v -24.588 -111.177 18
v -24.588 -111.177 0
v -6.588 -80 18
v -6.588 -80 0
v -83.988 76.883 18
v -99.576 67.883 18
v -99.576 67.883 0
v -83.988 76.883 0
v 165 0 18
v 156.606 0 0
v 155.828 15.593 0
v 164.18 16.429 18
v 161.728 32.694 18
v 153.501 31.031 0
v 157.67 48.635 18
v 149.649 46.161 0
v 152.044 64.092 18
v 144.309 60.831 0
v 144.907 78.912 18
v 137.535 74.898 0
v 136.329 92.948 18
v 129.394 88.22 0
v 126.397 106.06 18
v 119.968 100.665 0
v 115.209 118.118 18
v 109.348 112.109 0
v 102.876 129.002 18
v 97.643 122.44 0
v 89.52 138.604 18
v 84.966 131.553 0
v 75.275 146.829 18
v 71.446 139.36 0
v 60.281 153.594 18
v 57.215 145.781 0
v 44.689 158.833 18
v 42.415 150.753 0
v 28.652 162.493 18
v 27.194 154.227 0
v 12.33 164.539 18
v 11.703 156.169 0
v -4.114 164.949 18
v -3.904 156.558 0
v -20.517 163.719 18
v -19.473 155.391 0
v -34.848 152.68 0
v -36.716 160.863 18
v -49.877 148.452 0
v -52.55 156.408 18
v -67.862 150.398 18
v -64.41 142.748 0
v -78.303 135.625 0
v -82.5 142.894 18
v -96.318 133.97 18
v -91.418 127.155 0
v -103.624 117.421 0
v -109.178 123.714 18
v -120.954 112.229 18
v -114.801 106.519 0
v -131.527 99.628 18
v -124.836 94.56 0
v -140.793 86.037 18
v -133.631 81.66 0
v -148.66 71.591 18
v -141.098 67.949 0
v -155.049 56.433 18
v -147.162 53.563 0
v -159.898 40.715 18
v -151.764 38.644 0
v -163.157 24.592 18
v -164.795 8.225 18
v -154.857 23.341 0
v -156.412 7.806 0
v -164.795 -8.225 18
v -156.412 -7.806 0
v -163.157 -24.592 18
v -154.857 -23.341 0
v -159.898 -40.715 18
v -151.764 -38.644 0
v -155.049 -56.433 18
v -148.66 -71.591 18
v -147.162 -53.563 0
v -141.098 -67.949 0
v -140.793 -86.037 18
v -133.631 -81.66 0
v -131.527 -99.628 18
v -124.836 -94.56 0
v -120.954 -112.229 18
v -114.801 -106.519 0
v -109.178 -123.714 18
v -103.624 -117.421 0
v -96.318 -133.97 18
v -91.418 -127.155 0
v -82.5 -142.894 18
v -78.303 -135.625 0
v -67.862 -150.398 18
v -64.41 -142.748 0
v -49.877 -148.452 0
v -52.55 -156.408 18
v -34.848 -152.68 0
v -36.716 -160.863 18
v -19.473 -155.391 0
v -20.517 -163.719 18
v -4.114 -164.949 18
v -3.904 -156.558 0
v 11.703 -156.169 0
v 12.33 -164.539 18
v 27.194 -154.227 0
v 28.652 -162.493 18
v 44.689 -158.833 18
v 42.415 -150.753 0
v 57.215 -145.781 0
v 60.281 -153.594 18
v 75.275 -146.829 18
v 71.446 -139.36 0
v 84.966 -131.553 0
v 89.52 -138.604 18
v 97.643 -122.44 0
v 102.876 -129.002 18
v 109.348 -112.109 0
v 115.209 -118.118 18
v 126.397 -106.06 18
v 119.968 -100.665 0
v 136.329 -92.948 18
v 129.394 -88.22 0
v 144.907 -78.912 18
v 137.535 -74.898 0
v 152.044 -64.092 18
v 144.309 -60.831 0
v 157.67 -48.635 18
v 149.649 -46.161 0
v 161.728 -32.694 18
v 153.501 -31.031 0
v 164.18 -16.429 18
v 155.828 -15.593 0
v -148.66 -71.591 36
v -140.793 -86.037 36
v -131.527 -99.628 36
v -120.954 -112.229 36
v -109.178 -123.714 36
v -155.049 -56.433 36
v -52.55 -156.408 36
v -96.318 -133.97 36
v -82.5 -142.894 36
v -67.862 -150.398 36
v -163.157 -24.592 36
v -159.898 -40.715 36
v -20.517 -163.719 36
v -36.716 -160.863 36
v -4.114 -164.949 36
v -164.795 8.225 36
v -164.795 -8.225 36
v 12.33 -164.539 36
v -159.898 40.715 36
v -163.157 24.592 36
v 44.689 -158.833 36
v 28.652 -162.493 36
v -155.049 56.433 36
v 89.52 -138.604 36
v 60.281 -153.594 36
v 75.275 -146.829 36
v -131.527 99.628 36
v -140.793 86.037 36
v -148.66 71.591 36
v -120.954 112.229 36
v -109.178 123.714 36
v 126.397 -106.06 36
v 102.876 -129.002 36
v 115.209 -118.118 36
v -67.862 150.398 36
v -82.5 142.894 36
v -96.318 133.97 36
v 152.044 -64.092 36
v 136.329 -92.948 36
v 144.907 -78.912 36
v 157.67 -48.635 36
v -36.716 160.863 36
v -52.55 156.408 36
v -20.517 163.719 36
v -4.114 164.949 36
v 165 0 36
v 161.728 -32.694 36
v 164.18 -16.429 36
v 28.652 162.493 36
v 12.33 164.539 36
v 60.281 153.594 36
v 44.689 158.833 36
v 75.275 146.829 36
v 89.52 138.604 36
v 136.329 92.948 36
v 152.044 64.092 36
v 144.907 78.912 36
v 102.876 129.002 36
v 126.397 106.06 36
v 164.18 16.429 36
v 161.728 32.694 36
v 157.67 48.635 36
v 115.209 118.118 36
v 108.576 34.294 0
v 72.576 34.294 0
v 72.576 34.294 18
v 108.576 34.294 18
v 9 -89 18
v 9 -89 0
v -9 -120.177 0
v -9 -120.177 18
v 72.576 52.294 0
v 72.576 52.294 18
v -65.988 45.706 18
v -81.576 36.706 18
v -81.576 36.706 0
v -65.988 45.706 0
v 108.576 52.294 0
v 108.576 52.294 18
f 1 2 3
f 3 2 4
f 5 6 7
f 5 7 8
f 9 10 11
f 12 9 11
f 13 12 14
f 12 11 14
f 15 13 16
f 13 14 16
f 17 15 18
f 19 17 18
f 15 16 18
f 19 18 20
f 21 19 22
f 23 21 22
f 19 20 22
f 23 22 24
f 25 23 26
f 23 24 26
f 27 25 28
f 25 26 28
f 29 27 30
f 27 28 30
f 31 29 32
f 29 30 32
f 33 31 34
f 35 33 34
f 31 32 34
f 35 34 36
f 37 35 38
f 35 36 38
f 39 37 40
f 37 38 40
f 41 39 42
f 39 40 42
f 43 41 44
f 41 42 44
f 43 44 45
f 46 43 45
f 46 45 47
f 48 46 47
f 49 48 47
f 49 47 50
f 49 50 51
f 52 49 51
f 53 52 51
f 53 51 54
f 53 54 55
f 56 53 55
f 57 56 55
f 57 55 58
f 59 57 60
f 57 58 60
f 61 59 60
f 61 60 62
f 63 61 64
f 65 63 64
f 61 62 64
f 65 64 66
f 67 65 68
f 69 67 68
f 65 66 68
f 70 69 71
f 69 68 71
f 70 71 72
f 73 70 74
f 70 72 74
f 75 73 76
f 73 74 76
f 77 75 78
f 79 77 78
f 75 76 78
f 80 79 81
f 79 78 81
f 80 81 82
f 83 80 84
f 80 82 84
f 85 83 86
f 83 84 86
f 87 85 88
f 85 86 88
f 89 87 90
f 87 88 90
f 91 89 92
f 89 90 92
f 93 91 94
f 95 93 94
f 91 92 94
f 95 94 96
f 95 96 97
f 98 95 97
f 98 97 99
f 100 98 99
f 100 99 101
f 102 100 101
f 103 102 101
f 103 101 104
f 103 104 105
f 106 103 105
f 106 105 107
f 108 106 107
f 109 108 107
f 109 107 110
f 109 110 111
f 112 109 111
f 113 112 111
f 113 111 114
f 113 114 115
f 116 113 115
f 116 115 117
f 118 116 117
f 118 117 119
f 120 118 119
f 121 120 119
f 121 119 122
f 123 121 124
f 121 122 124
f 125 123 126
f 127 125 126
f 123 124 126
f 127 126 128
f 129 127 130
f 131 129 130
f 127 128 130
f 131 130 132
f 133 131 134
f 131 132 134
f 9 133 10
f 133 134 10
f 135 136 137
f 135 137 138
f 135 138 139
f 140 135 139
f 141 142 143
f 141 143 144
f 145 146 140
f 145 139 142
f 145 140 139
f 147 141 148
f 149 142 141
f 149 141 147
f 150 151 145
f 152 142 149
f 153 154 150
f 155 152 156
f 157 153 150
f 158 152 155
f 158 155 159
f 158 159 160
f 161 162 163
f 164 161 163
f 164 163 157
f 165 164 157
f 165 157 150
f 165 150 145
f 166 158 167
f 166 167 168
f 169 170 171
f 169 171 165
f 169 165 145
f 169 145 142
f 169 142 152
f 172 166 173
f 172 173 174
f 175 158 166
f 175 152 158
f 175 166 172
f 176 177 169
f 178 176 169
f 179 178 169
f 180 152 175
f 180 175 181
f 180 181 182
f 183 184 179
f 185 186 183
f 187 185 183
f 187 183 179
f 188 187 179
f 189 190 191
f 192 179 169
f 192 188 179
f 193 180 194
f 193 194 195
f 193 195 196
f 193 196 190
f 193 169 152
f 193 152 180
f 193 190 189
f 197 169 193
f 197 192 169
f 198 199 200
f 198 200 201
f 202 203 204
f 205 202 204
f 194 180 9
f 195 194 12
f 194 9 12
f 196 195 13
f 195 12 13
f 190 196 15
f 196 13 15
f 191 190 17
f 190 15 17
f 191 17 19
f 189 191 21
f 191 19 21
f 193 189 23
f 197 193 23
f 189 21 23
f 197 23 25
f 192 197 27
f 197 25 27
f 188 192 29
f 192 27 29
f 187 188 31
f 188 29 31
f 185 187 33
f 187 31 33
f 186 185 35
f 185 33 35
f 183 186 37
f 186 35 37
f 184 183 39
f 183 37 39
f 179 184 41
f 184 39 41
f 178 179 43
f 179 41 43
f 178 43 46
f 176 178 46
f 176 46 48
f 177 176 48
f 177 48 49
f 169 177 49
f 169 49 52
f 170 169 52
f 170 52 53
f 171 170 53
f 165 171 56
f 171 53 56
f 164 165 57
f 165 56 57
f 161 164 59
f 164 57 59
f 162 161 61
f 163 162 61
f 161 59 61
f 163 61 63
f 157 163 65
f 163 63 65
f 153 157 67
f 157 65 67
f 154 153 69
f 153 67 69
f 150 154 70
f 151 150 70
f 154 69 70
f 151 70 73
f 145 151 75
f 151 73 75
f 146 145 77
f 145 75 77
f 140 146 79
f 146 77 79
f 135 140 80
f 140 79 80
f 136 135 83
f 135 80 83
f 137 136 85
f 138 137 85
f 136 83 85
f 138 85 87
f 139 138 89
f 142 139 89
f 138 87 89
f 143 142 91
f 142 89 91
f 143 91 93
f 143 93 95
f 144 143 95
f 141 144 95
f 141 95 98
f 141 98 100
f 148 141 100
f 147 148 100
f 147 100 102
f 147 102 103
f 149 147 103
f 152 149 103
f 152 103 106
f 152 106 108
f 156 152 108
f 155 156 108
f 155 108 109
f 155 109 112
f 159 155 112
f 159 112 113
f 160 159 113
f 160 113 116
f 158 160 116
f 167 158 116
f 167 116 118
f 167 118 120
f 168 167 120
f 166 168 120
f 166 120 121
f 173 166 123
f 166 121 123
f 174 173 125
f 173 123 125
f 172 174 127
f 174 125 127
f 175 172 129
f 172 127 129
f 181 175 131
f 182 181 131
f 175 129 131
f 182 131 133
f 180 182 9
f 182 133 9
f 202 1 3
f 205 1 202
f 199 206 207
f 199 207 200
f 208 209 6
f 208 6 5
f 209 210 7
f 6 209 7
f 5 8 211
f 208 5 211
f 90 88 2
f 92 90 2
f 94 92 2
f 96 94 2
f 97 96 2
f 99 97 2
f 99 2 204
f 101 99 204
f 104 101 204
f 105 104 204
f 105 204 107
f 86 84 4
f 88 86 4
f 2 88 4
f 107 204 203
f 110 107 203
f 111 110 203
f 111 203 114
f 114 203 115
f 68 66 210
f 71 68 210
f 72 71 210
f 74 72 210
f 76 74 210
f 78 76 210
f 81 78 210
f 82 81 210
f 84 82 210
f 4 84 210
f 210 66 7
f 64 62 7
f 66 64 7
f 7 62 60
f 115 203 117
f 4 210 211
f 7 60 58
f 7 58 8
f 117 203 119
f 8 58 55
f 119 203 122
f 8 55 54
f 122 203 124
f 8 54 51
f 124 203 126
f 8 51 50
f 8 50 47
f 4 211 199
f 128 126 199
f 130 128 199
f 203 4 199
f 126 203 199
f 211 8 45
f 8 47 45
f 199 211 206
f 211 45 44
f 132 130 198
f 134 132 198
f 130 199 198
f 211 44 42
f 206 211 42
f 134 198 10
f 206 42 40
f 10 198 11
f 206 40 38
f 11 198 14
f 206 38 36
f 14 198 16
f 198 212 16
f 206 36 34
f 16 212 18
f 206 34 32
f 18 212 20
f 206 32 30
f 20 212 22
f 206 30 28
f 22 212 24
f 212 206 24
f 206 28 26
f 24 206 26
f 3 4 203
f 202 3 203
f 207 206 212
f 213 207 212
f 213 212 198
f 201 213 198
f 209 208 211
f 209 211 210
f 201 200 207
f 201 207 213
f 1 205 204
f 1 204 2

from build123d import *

# Parameters (mm, degrees)
F0_R     = 165
F1_DEPTH = 36
F2_W     = 36
F2_H     = 18
F3_DEPTH = 18
F4_SIZE2 = 8.393538
F4_SIZE  = 18


with BuildPart() as f1:
    # F0 (on Top) → F1 (new body)
    with BuildSketch(Plane.XY):
        Circle(F0_R)
    extrude(amount=F1_DEPTH)

    # F2 (on face) → F3 (cut)
    with BuildSketch(Plane(origin=(0, 0, 0), x_dir=(1, 0, 0), z_dir=(0, 0, -1))):
        Polygon((-9, 120.176915), (-24.588457, 111.176915), (-6.588457, 80), (9, 89), align=None)
        with Locations((90.576261, -43.294229)):
            Rectangle(F2_W, F2_H)
        Polygon((-81.576261, -36.705771), (-99.576261, -67.882686), (-83.987804, -76.882686), (-65.987804, -45.705771), align=None)
    extrude(amount=-F3_DEPTH, mode=Mode.SUBTRACT)

    # F4
    f4_edges = [f1.edges().sort_by_distance(p)[0] for p in [
        (-165, 0, 0),
    ]]
    chamfer(f4_edges, length=F4_SIZE, length2=F4_SIZE2)


solid = f1.part
